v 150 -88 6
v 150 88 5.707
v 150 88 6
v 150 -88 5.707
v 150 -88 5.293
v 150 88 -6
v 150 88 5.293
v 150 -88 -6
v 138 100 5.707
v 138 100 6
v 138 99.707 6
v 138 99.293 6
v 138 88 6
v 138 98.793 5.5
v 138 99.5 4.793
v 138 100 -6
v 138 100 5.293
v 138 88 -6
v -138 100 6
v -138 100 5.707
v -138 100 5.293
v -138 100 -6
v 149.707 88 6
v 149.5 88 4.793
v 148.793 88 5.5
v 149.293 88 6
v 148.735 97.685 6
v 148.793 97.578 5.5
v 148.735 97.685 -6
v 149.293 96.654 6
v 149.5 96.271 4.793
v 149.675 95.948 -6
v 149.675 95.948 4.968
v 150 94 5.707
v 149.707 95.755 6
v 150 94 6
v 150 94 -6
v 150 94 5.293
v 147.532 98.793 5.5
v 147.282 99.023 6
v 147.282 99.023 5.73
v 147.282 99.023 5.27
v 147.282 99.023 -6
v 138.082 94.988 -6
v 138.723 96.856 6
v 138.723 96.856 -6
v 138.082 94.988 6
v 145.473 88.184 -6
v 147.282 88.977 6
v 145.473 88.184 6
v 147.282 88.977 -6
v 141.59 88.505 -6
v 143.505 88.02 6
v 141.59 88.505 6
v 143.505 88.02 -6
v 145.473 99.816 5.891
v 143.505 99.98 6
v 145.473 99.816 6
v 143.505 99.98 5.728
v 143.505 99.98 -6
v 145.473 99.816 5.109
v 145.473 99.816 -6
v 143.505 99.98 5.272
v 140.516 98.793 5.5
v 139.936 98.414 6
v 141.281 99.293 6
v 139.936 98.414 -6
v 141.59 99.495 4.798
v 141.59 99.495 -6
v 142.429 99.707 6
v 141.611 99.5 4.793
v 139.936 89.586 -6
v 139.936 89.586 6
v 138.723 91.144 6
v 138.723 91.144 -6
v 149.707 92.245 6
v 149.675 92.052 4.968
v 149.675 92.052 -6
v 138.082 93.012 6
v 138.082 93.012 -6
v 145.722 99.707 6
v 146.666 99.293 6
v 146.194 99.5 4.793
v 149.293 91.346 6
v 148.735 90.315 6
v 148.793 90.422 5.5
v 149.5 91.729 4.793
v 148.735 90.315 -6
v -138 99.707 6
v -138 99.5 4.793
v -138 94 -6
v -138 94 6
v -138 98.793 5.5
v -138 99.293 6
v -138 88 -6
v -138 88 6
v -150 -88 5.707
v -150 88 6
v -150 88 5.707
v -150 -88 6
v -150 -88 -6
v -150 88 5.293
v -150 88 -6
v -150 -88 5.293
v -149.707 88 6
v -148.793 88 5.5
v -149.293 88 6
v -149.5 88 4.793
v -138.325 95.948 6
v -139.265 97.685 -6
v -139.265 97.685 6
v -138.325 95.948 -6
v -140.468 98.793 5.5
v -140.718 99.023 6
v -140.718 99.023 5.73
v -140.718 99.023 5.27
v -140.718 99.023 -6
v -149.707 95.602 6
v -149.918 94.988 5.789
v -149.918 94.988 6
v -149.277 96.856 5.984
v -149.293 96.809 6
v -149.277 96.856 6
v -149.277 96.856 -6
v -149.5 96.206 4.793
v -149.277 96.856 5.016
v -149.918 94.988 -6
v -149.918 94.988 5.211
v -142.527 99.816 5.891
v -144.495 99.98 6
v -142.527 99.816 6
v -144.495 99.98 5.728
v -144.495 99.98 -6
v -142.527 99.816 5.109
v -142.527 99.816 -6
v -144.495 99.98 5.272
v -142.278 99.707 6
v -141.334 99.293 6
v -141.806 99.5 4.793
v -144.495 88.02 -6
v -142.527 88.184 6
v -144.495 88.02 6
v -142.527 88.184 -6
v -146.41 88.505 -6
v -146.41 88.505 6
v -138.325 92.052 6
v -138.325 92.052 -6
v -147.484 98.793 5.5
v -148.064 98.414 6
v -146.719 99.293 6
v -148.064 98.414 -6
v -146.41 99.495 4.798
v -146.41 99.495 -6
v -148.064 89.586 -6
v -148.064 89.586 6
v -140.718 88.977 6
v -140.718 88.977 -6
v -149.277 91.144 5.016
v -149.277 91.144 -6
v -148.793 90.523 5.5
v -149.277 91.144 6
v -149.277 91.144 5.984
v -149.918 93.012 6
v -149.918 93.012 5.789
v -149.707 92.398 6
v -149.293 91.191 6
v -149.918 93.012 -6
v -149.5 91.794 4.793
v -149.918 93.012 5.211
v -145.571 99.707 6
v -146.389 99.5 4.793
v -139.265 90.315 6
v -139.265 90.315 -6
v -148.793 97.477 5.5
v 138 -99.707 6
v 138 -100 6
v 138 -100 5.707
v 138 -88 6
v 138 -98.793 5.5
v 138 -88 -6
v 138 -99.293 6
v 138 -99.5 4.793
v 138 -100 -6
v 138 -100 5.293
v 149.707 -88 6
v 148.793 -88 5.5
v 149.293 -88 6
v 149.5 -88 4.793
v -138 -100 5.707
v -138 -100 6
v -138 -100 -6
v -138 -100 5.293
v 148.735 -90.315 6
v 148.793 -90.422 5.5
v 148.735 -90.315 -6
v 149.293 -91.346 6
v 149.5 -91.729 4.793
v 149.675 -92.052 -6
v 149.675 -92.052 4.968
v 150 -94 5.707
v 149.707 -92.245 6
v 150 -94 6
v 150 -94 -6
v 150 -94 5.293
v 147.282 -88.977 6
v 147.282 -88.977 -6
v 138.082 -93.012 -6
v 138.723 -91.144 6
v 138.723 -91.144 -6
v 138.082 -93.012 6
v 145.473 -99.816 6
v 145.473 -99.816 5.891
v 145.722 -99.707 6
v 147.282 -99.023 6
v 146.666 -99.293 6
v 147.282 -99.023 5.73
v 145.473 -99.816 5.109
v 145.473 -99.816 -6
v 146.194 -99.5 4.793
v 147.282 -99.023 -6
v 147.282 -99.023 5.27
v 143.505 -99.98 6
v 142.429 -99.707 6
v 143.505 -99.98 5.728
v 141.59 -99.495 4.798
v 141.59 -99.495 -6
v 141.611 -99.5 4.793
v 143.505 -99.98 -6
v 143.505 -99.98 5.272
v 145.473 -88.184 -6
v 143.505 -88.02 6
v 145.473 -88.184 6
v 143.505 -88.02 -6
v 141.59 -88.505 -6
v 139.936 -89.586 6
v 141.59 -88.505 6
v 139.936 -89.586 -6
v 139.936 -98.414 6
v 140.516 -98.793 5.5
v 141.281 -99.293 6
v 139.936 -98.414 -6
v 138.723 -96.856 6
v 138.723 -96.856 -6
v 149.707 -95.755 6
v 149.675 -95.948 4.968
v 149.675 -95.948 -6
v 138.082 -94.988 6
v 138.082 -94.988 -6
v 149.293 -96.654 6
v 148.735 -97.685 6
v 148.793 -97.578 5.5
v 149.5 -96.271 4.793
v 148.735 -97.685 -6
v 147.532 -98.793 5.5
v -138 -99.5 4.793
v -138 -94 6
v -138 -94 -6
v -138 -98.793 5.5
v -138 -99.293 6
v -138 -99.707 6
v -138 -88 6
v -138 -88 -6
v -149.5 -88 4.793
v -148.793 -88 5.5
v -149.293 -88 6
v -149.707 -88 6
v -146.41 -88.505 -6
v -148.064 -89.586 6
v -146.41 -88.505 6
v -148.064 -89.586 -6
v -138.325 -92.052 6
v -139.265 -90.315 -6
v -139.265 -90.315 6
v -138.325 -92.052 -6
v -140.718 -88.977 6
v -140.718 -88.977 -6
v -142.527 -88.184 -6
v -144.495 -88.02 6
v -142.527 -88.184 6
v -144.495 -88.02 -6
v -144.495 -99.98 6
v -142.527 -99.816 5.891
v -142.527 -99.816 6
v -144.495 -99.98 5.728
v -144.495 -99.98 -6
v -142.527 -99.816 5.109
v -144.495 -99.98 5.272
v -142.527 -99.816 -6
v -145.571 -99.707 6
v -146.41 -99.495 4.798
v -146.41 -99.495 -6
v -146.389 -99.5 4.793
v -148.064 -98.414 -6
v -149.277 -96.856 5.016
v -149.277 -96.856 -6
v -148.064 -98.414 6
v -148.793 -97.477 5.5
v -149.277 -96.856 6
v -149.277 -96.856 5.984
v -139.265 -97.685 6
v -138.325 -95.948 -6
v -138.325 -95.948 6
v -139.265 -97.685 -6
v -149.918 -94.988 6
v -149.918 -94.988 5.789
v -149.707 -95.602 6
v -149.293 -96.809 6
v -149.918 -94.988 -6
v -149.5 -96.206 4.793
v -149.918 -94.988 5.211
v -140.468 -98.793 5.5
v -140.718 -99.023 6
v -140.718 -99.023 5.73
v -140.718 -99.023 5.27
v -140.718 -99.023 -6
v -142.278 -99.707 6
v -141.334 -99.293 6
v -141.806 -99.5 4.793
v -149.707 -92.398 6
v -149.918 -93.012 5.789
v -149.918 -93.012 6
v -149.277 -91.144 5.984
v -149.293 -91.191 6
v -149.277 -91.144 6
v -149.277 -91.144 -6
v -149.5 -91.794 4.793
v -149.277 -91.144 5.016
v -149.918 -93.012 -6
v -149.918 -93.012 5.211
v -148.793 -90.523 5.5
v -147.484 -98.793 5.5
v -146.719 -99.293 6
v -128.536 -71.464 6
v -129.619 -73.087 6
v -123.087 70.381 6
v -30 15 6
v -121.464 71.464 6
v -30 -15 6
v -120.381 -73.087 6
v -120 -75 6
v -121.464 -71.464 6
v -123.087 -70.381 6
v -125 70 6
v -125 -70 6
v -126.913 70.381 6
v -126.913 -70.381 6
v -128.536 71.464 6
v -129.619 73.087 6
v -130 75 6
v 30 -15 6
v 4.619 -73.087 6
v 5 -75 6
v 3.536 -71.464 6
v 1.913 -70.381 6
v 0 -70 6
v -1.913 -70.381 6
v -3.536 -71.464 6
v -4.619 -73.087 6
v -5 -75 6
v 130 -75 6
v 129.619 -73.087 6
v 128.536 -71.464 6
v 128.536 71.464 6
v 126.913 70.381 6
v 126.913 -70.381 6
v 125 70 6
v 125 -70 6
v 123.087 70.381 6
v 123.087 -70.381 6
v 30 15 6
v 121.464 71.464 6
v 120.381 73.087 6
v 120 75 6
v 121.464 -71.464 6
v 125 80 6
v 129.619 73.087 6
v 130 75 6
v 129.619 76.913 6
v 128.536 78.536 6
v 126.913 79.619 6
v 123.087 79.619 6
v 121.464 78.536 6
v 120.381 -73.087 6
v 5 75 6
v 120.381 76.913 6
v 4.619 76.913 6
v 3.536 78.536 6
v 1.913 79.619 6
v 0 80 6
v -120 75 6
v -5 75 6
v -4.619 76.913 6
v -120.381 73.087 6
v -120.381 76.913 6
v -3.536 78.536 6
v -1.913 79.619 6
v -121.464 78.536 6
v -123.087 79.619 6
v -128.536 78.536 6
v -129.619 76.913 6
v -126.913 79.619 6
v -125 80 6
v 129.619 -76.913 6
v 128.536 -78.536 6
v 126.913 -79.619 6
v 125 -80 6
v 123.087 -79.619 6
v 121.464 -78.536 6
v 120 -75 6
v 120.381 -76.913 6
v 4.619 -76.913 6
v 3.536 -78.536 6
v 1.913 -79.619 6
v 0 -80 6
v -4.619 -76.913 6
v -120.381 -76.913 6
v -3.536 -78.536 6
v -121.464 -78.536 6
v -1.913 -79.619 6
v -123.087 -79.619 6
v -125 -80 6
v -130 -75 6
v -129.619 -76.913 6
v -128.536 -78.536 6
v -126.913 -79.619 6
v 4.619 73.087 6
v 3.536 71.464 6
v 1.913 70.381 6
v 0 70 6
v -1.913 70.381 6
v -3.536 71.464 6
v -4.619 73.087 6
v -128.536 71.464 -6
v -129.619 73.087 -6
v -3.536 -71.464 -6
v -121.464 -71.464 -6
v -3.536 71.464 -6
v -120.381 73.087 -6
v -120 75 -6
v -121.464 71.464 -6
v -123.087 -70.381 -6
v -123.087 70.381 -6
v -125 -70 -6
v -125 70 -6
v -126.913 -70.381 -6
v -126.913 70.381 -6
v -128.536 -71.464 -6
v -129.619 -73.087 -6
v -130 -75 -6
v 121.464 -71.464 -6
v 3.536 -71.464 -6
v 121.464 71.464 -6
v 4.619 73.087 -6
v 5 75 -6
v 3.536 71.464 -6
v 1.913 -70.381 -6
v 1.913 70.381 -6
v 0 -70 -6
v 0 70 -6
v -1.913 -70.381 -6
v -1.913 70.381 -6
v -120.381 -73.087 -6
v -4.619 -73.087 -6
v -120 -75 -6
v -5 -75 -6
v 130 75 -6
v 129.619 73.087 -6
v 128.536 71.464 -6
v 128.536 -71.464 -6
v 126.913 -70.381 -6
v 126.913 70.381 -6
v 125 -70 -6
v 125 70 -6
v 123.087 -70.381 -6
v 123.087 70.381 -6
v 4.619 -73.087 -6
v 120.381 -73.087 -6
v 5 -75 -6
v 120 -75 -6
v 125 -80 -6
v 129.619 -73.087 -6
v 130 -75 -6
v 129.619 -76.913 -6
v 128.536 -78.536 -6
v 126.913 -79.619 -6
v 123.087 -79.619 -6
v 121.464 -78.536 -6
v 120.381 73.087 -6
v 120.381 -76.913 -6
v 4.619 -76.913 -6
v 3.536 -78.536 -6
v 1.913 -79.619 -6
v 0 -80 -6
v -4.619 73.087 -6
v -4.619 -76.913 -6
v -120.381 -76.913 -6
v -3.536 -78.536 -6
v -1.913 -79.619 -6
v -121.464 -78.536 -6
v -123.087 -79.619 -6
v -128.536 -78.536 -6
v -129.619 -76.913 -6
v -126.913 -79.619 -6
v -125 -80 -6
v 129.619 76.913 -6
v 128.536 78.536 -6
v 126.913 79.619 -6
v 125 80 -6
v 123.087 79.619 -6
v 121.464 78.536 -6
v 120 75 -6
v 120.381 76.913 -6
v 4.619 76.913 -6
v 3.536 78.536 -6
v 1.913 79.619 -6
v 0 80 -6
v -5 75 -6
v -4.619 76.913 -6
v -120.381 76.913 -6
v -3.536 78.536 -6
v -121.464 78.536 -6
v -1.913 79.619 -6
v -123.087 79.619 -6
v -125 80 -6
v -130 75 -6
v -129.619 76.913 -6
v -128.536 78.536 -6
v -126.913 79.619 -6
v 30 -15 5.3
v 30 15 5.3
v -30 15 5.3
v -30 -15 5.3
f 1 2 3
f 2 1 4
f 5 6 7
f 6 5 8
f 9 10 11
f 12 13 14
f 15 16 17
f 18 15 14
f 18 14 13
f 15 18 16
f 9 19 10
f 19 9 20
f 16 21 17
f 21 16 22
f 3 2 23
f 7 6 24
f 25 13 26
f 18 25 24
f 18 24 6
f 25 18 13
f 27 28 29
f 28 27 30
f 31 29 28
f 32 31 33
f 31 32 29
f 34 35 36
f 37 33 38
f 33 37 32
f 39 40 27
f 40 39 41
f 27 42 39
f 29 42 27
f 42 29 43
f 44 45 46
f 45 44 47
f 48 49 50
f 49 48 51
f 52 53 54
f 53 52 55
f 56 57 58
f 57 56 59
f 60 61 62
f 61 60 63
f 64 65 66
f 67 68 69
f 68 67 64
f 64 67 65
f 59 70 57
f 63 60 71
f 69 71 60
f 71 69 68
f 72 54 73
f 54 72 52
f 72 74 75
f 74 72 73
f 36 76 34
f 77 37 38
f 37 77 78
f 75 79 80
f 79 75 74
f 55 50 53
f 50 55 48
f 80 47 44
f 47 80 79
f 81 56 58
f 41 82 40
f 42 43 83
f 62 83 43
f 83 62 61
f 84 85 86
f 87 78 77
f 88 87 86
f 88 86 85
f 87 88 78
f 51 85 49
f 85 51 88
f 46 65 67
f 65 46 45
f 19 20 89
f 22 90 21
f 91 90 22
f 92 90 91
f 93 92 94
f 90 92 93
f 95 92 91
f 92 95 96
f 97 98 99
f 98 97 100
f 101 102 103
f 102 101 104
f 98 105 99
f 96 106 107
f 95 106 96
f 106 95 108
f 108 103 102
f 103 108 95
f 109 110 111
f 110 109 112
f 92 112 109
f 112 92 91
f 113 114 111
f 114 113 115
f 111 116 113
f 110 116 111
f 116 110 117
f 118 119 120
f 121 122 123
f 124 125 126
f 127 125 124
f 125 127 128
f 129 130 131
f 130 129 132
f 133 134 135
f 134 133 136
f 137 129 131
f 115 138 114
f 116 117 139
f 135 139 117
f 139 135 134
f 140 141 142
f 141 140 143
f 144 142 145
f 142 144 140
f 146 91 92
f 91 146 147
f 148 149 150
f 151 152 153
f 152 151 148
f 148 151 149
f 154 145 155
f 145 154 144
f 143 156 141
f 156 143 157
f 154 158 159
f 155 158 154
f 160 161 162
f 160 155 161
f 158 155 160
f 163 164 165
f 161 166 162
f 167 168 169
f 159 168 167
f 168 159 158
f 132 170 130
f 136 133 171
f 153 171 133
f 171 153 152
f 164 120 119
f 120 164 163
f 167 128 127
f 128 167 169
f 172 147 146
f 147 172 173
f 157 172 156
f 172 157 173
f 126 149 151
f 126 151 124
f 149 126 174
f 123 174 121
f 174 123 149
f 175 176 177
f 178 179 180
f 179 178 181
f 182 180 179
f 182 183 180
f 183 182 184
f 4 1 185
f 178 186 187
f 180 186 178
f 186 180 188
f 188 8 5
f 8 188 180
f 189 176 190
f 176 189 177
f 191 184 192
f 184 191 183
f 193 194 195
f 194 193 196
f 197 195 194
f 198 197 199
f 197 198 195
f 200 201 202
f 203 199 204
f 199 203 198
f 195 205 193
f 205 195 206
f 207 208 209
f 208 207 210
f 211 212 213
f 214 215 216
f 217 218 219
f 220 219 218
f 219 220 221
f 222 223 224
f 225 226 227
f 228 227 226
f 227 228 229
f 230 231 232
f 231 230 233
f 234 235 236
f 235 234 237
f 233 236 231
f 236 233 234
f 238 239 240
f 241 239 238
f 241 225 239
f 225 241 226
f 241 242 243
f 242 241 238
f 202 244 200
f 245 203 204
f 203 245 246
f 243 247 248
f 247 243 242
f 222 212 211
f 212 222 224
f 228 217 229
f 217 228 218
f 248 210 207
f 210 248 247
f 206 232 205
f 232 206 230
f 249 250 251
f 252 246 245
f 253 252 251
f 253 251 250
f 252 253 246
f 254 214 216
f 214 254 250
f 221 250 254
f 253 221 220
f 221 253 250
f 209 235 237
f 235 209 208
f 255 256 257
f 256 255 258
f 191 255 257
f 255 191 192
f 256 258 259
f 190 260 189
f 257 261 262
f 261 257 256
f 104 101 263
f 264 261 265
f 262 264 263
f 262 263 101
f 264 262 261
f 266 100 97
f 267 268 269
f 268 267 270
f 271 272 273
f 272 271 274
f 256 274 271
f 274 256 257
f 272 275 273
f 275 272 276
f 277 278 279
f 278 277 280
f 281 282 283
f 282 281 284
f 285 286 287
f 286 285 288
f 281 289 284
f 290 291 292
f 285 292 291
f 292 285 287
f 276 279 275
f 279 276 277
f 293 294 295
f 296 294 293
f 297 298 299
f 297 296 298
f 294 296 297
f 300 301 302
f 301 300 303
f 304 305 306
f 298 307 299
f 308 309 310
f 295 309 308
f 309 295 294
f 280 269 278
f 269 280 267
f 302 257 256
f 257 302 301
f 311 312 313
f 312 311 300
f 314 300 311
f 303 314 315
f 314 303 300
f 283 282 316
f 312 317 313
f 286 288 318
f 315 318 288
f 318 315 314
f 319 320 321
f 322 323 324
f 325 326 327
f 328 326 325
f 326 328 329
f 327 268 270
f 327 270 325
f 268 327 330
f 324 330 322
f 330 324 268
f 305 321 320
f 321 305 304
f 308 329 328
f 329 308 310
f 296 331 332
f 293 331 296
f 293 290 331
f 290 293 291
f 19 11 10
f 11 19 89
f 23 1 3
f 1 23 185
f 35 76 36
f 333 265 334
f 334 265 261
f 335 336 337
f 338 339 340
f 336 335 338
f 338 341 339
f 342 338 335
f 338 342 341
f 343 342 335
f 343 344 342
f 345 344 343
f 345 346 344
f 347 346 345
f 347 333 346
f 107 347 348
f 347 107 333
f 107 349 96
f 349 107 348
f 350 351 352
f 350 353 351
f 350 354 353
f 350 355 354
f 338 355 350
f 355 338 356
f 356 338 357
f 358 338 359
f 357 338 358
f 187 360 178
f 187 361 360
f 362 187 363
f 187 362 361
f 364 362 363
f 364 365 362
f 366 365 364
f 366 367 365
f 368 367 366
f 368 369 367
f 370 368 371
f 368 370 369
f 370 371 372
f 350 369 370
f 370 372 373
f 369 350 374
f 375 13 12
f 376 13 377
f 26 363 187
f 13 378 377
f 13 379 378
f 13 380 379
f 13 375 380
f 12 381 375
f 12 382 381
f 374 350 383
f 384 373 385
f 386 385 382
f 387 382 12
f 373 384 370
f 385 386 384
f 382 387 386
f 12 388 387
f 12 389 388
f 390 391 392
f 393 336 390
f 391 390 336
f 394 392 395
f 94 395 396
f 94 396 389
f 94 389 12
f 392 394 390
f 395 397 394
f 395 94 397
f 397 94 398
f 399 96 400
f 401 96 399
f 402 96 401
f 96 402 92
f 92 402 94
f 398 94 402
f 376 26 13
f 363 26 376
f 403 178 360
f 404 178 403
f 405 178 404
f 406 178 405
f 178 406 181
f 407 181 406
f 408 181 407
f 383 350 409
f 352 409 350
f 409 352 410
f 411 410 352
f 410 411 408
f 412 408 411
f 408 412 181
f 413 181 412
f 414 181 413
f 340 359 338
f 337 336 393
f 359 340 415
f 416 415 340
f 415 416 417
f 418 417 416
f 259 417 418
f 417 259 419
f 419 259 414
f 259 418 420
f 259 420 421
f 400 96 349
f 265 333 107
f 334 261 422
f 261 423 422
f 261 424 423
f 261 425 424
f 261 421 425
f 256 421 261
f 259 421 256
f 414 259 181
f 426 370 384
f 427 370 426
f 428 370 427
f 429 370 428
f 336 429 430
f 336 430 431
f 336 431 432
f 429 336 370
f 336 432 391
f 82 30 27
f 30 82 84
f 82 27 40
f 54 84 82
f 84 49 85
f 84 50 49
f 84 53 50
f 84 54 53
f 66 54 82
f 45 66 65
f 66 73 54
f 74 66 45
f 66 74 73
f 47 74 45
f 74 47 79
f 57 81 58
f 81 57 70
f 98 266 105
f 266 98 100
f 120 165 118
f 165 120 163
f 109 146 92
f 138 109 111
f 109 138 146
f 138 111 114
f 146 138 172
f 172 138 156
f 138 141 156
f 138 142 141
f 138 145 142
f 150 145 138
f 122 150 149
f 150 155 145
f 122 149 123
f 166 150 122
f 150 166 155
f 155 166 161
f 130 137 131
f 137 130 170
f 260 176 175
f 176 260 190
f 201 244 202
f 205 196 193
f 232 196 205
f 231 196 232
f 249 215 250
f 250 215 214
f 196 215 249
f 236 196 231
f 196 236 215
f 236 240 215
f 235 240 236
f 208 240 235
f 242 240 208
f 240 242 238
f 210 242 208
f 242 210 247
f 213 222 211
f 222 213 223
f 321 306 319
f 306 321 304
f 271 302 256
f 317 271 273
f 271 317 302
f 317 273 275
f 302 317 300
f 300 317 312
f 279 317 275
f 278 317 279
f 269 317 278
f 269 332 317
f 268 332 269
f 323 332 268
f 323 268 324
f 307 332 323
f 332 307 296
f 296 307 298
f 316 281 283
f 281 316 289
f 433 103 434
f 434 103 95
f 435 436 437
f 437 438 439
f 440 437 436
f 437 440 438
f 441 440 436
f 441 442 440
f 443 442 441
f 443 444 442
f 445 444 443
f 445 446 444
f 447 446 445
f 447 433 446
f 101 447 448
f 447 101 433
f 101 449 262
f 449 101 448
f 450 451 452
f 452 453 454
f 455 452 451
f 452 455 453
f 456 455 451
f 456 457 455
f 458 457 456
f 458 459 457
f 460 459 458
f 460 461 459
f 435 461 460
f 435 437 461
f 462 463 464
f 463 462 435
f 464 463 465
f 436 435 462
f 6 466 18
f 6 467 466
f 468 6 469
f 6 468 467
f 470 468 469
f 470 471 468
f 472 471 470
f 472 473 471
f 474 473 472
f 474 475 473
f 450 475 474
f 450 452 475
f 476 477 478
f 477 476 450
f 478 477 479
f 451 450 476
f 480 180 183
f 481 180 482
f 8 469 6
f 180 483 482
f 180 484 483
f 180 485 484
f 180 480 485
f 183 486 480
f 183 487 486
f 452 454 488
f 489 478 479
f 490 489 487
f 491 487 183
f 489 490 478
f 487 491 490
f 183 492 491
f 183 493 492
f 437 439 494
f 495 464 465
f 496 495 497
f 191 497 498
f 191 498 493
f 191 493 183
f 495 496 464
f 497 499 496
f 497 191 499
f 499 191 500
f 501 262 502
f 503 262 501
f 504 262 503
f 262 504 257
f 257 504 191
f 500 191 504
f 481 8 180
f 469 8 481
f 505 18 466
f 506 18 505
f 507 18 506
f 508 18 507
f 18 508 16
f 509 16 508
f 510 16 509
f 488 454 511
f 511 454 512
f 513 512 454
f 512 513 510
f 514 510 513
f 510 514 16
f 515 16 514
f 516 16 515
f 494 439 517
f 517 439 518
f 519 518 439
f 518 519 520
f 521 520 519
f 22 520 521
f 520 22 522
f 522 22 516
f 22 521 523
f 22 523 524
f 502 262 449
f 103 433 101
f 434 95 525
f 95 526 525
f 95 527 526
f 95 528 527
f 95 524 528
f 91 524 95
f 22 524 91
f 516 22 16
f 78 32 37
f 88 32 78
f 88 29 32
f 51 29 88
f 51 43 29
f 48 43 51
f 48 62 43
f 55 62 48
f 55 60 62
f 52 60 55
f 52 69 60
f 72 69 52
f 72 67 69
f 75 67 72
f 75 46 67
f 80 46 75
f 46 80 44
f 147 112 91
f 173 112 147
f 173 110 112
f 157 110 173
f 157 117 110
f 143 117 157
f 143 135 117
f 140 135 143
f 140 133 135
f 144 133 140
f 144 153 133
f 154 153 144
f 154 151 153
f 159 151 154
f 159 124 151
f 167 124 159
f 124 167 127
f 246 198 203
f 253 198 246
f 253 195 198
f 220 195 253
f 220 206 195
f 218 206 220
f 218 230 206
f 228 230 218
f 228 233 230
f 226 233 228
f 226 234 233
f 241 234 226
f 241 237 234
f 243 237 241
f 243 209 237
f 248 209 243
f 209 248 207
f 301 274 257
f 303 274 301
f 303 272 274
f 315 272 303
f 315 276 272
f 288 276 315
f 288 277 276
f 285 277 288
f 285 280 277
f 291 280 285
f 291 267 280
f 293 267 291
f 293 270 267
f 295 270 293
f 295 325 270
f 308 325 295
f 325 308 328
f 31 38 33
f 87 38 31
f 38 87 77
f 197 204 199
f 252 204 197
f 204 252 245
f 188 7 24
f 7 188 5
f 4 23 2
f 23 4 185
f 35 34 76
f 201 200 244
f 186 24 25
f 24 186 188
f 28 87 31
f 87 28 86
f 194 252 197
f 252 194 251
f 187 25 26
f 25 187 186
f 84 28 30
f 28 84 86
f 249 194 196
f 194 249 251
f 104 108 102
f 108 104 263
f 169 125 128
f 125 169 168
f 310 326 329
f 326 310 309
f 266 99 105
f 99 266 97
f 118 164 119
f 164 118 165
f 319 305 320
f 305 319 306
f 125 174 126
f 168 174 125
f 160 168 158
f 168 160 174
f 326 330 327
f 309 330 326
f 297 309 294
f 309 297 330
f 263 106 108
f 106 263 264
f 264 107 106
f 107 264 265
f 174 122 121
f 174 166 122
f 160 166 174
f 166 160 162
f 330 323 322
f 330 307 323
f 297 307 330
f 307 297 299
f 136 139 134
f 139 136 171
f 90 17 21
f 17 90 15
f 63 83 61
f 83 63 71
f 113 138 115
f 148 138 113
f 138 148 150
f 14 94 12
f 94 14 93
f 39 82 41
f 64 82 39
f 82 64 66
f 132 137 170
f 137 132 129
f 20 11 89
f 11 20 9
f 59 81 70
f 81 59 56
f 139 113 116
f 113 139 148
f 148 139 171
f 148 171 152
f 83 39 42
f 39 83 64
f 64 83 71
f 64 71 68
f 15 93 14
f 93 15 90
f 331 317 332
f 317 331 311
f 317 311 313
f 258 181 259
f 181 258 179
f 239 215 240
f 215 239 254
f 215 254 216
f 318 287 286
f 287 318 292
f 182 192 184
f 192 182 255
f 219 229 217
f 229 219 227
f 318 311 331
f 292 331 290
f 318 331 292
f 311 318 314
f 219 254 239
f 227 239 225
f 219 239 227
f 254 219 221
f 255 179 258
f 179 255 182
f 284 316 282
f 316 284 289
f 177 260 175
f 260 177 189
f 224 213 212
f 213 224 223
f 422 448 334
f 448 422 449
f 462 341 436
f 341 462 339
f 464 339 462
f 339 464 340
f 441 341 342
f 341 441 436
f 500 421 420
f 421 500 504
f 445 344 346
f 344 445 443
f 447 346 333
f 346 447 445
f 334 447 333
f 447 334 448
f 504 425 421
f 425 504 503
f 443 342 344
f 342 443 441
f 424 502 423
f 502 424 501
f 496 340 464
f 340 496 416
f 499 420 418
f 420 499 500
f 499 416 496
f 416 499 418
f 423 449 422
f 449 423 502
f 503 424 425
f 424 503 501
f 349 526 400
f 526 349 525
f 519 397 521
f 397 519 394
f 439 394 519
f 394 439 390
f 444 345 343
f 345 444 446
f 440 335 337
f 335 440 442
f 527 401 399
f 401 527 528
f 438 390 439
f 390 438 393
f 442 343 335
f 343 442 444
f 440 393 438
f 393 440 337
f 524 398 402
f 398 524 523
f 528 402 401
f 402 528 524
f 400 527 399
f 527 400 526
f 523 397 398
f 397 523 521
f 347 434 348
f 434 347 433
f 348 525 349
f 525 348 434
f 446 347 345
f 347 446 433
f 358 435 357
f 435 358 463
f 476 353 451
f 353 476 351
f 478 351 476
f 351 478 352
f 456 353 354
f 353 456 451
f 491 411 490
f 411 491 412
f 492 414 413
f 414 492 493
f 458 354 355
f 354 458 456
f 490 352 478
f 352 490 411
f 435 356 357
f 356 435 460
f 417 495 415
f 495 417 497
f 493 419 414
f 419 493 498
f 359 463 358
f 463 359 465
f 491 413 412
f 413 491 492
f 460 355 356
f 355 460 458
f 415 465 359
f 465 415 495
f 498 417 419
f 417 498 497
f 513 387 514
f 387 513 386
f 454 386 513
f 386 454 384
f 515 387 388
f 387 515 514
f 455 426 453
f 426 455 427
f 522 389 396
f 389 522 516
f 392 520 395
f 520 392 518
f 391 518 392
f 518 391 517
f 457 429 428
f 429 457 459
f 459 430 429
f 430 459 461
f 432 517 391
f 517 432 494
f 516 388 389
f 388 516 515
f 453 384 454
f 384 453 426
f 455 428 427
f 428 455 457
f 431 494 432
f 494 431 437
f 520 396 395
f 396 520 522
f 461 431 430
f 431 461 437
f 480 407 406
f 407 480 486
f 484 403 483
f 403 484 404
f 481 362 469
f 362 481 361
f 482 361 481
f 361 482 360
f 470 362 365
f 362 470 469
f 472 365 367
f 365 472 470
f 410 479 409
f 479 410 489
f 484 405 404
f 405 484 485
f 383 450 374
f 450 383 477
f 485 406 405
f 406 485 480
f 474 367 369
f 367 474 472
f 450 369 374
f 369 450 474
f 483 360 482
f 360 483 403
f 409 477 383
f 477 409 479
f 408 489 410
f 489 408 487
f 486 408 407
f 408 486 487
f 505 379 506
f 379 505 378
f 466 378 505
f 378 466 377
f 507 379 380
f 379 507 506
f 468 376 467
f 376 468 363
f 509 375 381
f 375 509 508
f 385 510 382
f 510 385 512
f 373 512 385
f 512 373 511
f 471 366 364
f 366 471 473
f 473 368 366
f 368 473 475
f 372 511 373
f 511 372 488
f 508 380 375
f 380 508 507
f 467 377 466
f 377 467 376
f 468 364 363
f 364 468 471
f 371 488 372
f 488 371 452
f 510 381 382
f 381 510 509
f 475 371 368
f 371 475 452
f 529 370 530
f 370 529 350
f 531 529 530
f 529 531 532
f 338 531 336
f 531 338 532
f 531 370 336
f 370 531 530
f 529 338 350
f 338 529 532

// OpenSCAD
// Parameters
plate_L = 300; //[150:600:1]
plate_W = 200; //[100:400:1]
plate_T = 12; //[6:24:1]
edge_chamfer = 0.5; //[0.25:2:0.25]
corner_radius = 6; //[3:12:1]
hole_d = 10; //[5:20:0.5]
hole_edge_margin = 25; //[12:50:1]
hole_count_x = 3; //[2:6:1]
hole_count_y = 2; //[2:5:1]
hole_pitch_x = 125; //[50:250:1]
hole_pitch_y = 150; //[50:250:1]
overlap = 1; //[0.5:2:0.5]
marking_depth = 0.2; //[0.1:1:0.1]
marking_L = 60; //[20:120:1]
marking_W = 30; //[10:80:1]

// Base shapes
module tooling_plate_body() {
  color("Silver")
  cube([plate_L, plate_W, plate_T], center=true);
}

module corner_cut_tr() {
  translate([plate_L/2 - corner_radius, plate_W/2 - corner_radius, 0])
  cube([corner_radius*2, corner_radius*2, plate_T + overlap*2], center=true);
}

module corner_round_tr() {
  translate([plate_L/2 - corner_radius, plate_W/2 - corner_radius, 0])
  cylinder(r=corner_radius, h=plate_T + overlap*2, center=true);
}

module corner_cut_tl() {
  translate([-plate_L/2 + corner_radius, plate_W/2 - corner_radius, 0])
  cube([corner_radius*2, corner_radius*2, plate_T + overlap*2], center=true);
}

module corner_round_tl() {
  translate([-plate_L/2 + corner_radius, plate_W/2 - corner_radius, 0])
  cylinder(r=corner_radius, h=plate_T + overlap*2, center=true);
}

module corner_cut_br() {
  translate([plate_L/2 - corner_radius, -plate_W/2 + corner_radius, 0])
  cube([corner_radius*2, corner_radius*2, plate_T + overlap*2], center=true);
}

module corner_round_br() {
  translate([plate_L/2 - corner_radius, -plate_W/2 + corner_radius, 0])
  cylinder(r=corner_radius, h=plate_T + overlap*2, center=true);
}

module corner_cut_bl() {
  translate([-plate_L/2 + corner_radius, -plate_W/2 + corner_radius, 0])
  cube([corner_radius*2, corner_radius*2, plate_T + overlap*2], center=true);
}

module corner_round_bl() {
  translate([-plate_L/2 + corner_radius, -plate_W/2 + corner_radius, 0])
  cylinder(r=corner_radius, h=plate_T + overlap*2, center=true);
}

module chamfer_wedge_x_pos() {
  translate([plate_L/2 - edge_chamfer, 0, plate_T/2 - edge_chamfer])
  rotate([0, 45, 0])
  cube([edge_chamfer*2, plate_W + overlap*2, edge_chamfer*2], center=true);
}

module chamfer_wedge_x_neg() {
  translate([-plate_L/2 + edge_chamfer, 0, plate_T/2 - edge_chamfer])
  rotate([0, -45, 0])
  cube([edge_chamfer*2, plate_W + overlap*2, edge_chamfer*2], center=true);
}

module chamfer_wedge_y_pos() {
  translate([0, plate_W/2 - edge_chamfer, plate_T/2 - edge_chamfer])
  rotate([45, 0, 0])
  cube([plate_L + overlap*2, edge_chamfer*2, edge_chamfer*2], center=true);
}

module chamfer_wedge_y_neg() {
  translate([0, -plate_W/2 + edge_chamfer, plate_T/2 - edge_chamfer])
  rotate([-45, 0, 0])
  cube([plate_L + overlap*2, edge_chamfer*2, edge_chamfer*2], center=true);
}

module mounting_hole(x, y) {
  translate([x, y, 0])
  cylinder(r=hole_d/2, h=plate_T + overlap*2, center=true);
}

module surface_marking_or_label() {
  translate([0, 0, plate_T/2 - marking_depth/2])
  cube([marking_L, marking_W, marking_depth + overlap], center=true);
}

// Operations
module corner_radius_tr() {
  difference() {
    corner_cut_tr();
    corner_round_tr();
  }
}

module corner_radius_tl() {
  difference() {
    corner_cut_tl();
    corner_round_tl();
  }
}

module corner_radius_br() {
  difference() {
    corner_cut_br();
    corner_round_br();
  }
}

module corner_radius_bl() {
  difference() {
    corner_cut_bl();
    corner_round_bl();
  }
}

module tooling_plate_with_corner_radius() {
  difference() {
    tooling_plate_body();
    corner_radius_tr();
    corner_radius_tl();
    corner_radius_br();
    corner_radius_bl();
  }
}

module edge_chamfer_or_round() {
  difference() {
    tooling_plate_with_corner_radius();
    chamfer_wedge_x_pos();
    chamfer_wedge_x_neg();
    chamfer_wedge_y_pos();
    chamfer_wedge_y_neg();
  }
}

module mounting_holes_pattern() {
  difference() {
    edge_chamfer_or_round();
    for (x = [-hole_pitch_x, 0, hole_pitch_x])
      for (y = [-hole_pitch_y/2, hole_pitch_y/2])
        mounting_hole(x, y);
  }
}

module final_tooling_plate() {
  difference() {
    mounting_holes_pattern();
    surface_marking_or_label();
  }
}

// Final output
final_tooling_plate();
